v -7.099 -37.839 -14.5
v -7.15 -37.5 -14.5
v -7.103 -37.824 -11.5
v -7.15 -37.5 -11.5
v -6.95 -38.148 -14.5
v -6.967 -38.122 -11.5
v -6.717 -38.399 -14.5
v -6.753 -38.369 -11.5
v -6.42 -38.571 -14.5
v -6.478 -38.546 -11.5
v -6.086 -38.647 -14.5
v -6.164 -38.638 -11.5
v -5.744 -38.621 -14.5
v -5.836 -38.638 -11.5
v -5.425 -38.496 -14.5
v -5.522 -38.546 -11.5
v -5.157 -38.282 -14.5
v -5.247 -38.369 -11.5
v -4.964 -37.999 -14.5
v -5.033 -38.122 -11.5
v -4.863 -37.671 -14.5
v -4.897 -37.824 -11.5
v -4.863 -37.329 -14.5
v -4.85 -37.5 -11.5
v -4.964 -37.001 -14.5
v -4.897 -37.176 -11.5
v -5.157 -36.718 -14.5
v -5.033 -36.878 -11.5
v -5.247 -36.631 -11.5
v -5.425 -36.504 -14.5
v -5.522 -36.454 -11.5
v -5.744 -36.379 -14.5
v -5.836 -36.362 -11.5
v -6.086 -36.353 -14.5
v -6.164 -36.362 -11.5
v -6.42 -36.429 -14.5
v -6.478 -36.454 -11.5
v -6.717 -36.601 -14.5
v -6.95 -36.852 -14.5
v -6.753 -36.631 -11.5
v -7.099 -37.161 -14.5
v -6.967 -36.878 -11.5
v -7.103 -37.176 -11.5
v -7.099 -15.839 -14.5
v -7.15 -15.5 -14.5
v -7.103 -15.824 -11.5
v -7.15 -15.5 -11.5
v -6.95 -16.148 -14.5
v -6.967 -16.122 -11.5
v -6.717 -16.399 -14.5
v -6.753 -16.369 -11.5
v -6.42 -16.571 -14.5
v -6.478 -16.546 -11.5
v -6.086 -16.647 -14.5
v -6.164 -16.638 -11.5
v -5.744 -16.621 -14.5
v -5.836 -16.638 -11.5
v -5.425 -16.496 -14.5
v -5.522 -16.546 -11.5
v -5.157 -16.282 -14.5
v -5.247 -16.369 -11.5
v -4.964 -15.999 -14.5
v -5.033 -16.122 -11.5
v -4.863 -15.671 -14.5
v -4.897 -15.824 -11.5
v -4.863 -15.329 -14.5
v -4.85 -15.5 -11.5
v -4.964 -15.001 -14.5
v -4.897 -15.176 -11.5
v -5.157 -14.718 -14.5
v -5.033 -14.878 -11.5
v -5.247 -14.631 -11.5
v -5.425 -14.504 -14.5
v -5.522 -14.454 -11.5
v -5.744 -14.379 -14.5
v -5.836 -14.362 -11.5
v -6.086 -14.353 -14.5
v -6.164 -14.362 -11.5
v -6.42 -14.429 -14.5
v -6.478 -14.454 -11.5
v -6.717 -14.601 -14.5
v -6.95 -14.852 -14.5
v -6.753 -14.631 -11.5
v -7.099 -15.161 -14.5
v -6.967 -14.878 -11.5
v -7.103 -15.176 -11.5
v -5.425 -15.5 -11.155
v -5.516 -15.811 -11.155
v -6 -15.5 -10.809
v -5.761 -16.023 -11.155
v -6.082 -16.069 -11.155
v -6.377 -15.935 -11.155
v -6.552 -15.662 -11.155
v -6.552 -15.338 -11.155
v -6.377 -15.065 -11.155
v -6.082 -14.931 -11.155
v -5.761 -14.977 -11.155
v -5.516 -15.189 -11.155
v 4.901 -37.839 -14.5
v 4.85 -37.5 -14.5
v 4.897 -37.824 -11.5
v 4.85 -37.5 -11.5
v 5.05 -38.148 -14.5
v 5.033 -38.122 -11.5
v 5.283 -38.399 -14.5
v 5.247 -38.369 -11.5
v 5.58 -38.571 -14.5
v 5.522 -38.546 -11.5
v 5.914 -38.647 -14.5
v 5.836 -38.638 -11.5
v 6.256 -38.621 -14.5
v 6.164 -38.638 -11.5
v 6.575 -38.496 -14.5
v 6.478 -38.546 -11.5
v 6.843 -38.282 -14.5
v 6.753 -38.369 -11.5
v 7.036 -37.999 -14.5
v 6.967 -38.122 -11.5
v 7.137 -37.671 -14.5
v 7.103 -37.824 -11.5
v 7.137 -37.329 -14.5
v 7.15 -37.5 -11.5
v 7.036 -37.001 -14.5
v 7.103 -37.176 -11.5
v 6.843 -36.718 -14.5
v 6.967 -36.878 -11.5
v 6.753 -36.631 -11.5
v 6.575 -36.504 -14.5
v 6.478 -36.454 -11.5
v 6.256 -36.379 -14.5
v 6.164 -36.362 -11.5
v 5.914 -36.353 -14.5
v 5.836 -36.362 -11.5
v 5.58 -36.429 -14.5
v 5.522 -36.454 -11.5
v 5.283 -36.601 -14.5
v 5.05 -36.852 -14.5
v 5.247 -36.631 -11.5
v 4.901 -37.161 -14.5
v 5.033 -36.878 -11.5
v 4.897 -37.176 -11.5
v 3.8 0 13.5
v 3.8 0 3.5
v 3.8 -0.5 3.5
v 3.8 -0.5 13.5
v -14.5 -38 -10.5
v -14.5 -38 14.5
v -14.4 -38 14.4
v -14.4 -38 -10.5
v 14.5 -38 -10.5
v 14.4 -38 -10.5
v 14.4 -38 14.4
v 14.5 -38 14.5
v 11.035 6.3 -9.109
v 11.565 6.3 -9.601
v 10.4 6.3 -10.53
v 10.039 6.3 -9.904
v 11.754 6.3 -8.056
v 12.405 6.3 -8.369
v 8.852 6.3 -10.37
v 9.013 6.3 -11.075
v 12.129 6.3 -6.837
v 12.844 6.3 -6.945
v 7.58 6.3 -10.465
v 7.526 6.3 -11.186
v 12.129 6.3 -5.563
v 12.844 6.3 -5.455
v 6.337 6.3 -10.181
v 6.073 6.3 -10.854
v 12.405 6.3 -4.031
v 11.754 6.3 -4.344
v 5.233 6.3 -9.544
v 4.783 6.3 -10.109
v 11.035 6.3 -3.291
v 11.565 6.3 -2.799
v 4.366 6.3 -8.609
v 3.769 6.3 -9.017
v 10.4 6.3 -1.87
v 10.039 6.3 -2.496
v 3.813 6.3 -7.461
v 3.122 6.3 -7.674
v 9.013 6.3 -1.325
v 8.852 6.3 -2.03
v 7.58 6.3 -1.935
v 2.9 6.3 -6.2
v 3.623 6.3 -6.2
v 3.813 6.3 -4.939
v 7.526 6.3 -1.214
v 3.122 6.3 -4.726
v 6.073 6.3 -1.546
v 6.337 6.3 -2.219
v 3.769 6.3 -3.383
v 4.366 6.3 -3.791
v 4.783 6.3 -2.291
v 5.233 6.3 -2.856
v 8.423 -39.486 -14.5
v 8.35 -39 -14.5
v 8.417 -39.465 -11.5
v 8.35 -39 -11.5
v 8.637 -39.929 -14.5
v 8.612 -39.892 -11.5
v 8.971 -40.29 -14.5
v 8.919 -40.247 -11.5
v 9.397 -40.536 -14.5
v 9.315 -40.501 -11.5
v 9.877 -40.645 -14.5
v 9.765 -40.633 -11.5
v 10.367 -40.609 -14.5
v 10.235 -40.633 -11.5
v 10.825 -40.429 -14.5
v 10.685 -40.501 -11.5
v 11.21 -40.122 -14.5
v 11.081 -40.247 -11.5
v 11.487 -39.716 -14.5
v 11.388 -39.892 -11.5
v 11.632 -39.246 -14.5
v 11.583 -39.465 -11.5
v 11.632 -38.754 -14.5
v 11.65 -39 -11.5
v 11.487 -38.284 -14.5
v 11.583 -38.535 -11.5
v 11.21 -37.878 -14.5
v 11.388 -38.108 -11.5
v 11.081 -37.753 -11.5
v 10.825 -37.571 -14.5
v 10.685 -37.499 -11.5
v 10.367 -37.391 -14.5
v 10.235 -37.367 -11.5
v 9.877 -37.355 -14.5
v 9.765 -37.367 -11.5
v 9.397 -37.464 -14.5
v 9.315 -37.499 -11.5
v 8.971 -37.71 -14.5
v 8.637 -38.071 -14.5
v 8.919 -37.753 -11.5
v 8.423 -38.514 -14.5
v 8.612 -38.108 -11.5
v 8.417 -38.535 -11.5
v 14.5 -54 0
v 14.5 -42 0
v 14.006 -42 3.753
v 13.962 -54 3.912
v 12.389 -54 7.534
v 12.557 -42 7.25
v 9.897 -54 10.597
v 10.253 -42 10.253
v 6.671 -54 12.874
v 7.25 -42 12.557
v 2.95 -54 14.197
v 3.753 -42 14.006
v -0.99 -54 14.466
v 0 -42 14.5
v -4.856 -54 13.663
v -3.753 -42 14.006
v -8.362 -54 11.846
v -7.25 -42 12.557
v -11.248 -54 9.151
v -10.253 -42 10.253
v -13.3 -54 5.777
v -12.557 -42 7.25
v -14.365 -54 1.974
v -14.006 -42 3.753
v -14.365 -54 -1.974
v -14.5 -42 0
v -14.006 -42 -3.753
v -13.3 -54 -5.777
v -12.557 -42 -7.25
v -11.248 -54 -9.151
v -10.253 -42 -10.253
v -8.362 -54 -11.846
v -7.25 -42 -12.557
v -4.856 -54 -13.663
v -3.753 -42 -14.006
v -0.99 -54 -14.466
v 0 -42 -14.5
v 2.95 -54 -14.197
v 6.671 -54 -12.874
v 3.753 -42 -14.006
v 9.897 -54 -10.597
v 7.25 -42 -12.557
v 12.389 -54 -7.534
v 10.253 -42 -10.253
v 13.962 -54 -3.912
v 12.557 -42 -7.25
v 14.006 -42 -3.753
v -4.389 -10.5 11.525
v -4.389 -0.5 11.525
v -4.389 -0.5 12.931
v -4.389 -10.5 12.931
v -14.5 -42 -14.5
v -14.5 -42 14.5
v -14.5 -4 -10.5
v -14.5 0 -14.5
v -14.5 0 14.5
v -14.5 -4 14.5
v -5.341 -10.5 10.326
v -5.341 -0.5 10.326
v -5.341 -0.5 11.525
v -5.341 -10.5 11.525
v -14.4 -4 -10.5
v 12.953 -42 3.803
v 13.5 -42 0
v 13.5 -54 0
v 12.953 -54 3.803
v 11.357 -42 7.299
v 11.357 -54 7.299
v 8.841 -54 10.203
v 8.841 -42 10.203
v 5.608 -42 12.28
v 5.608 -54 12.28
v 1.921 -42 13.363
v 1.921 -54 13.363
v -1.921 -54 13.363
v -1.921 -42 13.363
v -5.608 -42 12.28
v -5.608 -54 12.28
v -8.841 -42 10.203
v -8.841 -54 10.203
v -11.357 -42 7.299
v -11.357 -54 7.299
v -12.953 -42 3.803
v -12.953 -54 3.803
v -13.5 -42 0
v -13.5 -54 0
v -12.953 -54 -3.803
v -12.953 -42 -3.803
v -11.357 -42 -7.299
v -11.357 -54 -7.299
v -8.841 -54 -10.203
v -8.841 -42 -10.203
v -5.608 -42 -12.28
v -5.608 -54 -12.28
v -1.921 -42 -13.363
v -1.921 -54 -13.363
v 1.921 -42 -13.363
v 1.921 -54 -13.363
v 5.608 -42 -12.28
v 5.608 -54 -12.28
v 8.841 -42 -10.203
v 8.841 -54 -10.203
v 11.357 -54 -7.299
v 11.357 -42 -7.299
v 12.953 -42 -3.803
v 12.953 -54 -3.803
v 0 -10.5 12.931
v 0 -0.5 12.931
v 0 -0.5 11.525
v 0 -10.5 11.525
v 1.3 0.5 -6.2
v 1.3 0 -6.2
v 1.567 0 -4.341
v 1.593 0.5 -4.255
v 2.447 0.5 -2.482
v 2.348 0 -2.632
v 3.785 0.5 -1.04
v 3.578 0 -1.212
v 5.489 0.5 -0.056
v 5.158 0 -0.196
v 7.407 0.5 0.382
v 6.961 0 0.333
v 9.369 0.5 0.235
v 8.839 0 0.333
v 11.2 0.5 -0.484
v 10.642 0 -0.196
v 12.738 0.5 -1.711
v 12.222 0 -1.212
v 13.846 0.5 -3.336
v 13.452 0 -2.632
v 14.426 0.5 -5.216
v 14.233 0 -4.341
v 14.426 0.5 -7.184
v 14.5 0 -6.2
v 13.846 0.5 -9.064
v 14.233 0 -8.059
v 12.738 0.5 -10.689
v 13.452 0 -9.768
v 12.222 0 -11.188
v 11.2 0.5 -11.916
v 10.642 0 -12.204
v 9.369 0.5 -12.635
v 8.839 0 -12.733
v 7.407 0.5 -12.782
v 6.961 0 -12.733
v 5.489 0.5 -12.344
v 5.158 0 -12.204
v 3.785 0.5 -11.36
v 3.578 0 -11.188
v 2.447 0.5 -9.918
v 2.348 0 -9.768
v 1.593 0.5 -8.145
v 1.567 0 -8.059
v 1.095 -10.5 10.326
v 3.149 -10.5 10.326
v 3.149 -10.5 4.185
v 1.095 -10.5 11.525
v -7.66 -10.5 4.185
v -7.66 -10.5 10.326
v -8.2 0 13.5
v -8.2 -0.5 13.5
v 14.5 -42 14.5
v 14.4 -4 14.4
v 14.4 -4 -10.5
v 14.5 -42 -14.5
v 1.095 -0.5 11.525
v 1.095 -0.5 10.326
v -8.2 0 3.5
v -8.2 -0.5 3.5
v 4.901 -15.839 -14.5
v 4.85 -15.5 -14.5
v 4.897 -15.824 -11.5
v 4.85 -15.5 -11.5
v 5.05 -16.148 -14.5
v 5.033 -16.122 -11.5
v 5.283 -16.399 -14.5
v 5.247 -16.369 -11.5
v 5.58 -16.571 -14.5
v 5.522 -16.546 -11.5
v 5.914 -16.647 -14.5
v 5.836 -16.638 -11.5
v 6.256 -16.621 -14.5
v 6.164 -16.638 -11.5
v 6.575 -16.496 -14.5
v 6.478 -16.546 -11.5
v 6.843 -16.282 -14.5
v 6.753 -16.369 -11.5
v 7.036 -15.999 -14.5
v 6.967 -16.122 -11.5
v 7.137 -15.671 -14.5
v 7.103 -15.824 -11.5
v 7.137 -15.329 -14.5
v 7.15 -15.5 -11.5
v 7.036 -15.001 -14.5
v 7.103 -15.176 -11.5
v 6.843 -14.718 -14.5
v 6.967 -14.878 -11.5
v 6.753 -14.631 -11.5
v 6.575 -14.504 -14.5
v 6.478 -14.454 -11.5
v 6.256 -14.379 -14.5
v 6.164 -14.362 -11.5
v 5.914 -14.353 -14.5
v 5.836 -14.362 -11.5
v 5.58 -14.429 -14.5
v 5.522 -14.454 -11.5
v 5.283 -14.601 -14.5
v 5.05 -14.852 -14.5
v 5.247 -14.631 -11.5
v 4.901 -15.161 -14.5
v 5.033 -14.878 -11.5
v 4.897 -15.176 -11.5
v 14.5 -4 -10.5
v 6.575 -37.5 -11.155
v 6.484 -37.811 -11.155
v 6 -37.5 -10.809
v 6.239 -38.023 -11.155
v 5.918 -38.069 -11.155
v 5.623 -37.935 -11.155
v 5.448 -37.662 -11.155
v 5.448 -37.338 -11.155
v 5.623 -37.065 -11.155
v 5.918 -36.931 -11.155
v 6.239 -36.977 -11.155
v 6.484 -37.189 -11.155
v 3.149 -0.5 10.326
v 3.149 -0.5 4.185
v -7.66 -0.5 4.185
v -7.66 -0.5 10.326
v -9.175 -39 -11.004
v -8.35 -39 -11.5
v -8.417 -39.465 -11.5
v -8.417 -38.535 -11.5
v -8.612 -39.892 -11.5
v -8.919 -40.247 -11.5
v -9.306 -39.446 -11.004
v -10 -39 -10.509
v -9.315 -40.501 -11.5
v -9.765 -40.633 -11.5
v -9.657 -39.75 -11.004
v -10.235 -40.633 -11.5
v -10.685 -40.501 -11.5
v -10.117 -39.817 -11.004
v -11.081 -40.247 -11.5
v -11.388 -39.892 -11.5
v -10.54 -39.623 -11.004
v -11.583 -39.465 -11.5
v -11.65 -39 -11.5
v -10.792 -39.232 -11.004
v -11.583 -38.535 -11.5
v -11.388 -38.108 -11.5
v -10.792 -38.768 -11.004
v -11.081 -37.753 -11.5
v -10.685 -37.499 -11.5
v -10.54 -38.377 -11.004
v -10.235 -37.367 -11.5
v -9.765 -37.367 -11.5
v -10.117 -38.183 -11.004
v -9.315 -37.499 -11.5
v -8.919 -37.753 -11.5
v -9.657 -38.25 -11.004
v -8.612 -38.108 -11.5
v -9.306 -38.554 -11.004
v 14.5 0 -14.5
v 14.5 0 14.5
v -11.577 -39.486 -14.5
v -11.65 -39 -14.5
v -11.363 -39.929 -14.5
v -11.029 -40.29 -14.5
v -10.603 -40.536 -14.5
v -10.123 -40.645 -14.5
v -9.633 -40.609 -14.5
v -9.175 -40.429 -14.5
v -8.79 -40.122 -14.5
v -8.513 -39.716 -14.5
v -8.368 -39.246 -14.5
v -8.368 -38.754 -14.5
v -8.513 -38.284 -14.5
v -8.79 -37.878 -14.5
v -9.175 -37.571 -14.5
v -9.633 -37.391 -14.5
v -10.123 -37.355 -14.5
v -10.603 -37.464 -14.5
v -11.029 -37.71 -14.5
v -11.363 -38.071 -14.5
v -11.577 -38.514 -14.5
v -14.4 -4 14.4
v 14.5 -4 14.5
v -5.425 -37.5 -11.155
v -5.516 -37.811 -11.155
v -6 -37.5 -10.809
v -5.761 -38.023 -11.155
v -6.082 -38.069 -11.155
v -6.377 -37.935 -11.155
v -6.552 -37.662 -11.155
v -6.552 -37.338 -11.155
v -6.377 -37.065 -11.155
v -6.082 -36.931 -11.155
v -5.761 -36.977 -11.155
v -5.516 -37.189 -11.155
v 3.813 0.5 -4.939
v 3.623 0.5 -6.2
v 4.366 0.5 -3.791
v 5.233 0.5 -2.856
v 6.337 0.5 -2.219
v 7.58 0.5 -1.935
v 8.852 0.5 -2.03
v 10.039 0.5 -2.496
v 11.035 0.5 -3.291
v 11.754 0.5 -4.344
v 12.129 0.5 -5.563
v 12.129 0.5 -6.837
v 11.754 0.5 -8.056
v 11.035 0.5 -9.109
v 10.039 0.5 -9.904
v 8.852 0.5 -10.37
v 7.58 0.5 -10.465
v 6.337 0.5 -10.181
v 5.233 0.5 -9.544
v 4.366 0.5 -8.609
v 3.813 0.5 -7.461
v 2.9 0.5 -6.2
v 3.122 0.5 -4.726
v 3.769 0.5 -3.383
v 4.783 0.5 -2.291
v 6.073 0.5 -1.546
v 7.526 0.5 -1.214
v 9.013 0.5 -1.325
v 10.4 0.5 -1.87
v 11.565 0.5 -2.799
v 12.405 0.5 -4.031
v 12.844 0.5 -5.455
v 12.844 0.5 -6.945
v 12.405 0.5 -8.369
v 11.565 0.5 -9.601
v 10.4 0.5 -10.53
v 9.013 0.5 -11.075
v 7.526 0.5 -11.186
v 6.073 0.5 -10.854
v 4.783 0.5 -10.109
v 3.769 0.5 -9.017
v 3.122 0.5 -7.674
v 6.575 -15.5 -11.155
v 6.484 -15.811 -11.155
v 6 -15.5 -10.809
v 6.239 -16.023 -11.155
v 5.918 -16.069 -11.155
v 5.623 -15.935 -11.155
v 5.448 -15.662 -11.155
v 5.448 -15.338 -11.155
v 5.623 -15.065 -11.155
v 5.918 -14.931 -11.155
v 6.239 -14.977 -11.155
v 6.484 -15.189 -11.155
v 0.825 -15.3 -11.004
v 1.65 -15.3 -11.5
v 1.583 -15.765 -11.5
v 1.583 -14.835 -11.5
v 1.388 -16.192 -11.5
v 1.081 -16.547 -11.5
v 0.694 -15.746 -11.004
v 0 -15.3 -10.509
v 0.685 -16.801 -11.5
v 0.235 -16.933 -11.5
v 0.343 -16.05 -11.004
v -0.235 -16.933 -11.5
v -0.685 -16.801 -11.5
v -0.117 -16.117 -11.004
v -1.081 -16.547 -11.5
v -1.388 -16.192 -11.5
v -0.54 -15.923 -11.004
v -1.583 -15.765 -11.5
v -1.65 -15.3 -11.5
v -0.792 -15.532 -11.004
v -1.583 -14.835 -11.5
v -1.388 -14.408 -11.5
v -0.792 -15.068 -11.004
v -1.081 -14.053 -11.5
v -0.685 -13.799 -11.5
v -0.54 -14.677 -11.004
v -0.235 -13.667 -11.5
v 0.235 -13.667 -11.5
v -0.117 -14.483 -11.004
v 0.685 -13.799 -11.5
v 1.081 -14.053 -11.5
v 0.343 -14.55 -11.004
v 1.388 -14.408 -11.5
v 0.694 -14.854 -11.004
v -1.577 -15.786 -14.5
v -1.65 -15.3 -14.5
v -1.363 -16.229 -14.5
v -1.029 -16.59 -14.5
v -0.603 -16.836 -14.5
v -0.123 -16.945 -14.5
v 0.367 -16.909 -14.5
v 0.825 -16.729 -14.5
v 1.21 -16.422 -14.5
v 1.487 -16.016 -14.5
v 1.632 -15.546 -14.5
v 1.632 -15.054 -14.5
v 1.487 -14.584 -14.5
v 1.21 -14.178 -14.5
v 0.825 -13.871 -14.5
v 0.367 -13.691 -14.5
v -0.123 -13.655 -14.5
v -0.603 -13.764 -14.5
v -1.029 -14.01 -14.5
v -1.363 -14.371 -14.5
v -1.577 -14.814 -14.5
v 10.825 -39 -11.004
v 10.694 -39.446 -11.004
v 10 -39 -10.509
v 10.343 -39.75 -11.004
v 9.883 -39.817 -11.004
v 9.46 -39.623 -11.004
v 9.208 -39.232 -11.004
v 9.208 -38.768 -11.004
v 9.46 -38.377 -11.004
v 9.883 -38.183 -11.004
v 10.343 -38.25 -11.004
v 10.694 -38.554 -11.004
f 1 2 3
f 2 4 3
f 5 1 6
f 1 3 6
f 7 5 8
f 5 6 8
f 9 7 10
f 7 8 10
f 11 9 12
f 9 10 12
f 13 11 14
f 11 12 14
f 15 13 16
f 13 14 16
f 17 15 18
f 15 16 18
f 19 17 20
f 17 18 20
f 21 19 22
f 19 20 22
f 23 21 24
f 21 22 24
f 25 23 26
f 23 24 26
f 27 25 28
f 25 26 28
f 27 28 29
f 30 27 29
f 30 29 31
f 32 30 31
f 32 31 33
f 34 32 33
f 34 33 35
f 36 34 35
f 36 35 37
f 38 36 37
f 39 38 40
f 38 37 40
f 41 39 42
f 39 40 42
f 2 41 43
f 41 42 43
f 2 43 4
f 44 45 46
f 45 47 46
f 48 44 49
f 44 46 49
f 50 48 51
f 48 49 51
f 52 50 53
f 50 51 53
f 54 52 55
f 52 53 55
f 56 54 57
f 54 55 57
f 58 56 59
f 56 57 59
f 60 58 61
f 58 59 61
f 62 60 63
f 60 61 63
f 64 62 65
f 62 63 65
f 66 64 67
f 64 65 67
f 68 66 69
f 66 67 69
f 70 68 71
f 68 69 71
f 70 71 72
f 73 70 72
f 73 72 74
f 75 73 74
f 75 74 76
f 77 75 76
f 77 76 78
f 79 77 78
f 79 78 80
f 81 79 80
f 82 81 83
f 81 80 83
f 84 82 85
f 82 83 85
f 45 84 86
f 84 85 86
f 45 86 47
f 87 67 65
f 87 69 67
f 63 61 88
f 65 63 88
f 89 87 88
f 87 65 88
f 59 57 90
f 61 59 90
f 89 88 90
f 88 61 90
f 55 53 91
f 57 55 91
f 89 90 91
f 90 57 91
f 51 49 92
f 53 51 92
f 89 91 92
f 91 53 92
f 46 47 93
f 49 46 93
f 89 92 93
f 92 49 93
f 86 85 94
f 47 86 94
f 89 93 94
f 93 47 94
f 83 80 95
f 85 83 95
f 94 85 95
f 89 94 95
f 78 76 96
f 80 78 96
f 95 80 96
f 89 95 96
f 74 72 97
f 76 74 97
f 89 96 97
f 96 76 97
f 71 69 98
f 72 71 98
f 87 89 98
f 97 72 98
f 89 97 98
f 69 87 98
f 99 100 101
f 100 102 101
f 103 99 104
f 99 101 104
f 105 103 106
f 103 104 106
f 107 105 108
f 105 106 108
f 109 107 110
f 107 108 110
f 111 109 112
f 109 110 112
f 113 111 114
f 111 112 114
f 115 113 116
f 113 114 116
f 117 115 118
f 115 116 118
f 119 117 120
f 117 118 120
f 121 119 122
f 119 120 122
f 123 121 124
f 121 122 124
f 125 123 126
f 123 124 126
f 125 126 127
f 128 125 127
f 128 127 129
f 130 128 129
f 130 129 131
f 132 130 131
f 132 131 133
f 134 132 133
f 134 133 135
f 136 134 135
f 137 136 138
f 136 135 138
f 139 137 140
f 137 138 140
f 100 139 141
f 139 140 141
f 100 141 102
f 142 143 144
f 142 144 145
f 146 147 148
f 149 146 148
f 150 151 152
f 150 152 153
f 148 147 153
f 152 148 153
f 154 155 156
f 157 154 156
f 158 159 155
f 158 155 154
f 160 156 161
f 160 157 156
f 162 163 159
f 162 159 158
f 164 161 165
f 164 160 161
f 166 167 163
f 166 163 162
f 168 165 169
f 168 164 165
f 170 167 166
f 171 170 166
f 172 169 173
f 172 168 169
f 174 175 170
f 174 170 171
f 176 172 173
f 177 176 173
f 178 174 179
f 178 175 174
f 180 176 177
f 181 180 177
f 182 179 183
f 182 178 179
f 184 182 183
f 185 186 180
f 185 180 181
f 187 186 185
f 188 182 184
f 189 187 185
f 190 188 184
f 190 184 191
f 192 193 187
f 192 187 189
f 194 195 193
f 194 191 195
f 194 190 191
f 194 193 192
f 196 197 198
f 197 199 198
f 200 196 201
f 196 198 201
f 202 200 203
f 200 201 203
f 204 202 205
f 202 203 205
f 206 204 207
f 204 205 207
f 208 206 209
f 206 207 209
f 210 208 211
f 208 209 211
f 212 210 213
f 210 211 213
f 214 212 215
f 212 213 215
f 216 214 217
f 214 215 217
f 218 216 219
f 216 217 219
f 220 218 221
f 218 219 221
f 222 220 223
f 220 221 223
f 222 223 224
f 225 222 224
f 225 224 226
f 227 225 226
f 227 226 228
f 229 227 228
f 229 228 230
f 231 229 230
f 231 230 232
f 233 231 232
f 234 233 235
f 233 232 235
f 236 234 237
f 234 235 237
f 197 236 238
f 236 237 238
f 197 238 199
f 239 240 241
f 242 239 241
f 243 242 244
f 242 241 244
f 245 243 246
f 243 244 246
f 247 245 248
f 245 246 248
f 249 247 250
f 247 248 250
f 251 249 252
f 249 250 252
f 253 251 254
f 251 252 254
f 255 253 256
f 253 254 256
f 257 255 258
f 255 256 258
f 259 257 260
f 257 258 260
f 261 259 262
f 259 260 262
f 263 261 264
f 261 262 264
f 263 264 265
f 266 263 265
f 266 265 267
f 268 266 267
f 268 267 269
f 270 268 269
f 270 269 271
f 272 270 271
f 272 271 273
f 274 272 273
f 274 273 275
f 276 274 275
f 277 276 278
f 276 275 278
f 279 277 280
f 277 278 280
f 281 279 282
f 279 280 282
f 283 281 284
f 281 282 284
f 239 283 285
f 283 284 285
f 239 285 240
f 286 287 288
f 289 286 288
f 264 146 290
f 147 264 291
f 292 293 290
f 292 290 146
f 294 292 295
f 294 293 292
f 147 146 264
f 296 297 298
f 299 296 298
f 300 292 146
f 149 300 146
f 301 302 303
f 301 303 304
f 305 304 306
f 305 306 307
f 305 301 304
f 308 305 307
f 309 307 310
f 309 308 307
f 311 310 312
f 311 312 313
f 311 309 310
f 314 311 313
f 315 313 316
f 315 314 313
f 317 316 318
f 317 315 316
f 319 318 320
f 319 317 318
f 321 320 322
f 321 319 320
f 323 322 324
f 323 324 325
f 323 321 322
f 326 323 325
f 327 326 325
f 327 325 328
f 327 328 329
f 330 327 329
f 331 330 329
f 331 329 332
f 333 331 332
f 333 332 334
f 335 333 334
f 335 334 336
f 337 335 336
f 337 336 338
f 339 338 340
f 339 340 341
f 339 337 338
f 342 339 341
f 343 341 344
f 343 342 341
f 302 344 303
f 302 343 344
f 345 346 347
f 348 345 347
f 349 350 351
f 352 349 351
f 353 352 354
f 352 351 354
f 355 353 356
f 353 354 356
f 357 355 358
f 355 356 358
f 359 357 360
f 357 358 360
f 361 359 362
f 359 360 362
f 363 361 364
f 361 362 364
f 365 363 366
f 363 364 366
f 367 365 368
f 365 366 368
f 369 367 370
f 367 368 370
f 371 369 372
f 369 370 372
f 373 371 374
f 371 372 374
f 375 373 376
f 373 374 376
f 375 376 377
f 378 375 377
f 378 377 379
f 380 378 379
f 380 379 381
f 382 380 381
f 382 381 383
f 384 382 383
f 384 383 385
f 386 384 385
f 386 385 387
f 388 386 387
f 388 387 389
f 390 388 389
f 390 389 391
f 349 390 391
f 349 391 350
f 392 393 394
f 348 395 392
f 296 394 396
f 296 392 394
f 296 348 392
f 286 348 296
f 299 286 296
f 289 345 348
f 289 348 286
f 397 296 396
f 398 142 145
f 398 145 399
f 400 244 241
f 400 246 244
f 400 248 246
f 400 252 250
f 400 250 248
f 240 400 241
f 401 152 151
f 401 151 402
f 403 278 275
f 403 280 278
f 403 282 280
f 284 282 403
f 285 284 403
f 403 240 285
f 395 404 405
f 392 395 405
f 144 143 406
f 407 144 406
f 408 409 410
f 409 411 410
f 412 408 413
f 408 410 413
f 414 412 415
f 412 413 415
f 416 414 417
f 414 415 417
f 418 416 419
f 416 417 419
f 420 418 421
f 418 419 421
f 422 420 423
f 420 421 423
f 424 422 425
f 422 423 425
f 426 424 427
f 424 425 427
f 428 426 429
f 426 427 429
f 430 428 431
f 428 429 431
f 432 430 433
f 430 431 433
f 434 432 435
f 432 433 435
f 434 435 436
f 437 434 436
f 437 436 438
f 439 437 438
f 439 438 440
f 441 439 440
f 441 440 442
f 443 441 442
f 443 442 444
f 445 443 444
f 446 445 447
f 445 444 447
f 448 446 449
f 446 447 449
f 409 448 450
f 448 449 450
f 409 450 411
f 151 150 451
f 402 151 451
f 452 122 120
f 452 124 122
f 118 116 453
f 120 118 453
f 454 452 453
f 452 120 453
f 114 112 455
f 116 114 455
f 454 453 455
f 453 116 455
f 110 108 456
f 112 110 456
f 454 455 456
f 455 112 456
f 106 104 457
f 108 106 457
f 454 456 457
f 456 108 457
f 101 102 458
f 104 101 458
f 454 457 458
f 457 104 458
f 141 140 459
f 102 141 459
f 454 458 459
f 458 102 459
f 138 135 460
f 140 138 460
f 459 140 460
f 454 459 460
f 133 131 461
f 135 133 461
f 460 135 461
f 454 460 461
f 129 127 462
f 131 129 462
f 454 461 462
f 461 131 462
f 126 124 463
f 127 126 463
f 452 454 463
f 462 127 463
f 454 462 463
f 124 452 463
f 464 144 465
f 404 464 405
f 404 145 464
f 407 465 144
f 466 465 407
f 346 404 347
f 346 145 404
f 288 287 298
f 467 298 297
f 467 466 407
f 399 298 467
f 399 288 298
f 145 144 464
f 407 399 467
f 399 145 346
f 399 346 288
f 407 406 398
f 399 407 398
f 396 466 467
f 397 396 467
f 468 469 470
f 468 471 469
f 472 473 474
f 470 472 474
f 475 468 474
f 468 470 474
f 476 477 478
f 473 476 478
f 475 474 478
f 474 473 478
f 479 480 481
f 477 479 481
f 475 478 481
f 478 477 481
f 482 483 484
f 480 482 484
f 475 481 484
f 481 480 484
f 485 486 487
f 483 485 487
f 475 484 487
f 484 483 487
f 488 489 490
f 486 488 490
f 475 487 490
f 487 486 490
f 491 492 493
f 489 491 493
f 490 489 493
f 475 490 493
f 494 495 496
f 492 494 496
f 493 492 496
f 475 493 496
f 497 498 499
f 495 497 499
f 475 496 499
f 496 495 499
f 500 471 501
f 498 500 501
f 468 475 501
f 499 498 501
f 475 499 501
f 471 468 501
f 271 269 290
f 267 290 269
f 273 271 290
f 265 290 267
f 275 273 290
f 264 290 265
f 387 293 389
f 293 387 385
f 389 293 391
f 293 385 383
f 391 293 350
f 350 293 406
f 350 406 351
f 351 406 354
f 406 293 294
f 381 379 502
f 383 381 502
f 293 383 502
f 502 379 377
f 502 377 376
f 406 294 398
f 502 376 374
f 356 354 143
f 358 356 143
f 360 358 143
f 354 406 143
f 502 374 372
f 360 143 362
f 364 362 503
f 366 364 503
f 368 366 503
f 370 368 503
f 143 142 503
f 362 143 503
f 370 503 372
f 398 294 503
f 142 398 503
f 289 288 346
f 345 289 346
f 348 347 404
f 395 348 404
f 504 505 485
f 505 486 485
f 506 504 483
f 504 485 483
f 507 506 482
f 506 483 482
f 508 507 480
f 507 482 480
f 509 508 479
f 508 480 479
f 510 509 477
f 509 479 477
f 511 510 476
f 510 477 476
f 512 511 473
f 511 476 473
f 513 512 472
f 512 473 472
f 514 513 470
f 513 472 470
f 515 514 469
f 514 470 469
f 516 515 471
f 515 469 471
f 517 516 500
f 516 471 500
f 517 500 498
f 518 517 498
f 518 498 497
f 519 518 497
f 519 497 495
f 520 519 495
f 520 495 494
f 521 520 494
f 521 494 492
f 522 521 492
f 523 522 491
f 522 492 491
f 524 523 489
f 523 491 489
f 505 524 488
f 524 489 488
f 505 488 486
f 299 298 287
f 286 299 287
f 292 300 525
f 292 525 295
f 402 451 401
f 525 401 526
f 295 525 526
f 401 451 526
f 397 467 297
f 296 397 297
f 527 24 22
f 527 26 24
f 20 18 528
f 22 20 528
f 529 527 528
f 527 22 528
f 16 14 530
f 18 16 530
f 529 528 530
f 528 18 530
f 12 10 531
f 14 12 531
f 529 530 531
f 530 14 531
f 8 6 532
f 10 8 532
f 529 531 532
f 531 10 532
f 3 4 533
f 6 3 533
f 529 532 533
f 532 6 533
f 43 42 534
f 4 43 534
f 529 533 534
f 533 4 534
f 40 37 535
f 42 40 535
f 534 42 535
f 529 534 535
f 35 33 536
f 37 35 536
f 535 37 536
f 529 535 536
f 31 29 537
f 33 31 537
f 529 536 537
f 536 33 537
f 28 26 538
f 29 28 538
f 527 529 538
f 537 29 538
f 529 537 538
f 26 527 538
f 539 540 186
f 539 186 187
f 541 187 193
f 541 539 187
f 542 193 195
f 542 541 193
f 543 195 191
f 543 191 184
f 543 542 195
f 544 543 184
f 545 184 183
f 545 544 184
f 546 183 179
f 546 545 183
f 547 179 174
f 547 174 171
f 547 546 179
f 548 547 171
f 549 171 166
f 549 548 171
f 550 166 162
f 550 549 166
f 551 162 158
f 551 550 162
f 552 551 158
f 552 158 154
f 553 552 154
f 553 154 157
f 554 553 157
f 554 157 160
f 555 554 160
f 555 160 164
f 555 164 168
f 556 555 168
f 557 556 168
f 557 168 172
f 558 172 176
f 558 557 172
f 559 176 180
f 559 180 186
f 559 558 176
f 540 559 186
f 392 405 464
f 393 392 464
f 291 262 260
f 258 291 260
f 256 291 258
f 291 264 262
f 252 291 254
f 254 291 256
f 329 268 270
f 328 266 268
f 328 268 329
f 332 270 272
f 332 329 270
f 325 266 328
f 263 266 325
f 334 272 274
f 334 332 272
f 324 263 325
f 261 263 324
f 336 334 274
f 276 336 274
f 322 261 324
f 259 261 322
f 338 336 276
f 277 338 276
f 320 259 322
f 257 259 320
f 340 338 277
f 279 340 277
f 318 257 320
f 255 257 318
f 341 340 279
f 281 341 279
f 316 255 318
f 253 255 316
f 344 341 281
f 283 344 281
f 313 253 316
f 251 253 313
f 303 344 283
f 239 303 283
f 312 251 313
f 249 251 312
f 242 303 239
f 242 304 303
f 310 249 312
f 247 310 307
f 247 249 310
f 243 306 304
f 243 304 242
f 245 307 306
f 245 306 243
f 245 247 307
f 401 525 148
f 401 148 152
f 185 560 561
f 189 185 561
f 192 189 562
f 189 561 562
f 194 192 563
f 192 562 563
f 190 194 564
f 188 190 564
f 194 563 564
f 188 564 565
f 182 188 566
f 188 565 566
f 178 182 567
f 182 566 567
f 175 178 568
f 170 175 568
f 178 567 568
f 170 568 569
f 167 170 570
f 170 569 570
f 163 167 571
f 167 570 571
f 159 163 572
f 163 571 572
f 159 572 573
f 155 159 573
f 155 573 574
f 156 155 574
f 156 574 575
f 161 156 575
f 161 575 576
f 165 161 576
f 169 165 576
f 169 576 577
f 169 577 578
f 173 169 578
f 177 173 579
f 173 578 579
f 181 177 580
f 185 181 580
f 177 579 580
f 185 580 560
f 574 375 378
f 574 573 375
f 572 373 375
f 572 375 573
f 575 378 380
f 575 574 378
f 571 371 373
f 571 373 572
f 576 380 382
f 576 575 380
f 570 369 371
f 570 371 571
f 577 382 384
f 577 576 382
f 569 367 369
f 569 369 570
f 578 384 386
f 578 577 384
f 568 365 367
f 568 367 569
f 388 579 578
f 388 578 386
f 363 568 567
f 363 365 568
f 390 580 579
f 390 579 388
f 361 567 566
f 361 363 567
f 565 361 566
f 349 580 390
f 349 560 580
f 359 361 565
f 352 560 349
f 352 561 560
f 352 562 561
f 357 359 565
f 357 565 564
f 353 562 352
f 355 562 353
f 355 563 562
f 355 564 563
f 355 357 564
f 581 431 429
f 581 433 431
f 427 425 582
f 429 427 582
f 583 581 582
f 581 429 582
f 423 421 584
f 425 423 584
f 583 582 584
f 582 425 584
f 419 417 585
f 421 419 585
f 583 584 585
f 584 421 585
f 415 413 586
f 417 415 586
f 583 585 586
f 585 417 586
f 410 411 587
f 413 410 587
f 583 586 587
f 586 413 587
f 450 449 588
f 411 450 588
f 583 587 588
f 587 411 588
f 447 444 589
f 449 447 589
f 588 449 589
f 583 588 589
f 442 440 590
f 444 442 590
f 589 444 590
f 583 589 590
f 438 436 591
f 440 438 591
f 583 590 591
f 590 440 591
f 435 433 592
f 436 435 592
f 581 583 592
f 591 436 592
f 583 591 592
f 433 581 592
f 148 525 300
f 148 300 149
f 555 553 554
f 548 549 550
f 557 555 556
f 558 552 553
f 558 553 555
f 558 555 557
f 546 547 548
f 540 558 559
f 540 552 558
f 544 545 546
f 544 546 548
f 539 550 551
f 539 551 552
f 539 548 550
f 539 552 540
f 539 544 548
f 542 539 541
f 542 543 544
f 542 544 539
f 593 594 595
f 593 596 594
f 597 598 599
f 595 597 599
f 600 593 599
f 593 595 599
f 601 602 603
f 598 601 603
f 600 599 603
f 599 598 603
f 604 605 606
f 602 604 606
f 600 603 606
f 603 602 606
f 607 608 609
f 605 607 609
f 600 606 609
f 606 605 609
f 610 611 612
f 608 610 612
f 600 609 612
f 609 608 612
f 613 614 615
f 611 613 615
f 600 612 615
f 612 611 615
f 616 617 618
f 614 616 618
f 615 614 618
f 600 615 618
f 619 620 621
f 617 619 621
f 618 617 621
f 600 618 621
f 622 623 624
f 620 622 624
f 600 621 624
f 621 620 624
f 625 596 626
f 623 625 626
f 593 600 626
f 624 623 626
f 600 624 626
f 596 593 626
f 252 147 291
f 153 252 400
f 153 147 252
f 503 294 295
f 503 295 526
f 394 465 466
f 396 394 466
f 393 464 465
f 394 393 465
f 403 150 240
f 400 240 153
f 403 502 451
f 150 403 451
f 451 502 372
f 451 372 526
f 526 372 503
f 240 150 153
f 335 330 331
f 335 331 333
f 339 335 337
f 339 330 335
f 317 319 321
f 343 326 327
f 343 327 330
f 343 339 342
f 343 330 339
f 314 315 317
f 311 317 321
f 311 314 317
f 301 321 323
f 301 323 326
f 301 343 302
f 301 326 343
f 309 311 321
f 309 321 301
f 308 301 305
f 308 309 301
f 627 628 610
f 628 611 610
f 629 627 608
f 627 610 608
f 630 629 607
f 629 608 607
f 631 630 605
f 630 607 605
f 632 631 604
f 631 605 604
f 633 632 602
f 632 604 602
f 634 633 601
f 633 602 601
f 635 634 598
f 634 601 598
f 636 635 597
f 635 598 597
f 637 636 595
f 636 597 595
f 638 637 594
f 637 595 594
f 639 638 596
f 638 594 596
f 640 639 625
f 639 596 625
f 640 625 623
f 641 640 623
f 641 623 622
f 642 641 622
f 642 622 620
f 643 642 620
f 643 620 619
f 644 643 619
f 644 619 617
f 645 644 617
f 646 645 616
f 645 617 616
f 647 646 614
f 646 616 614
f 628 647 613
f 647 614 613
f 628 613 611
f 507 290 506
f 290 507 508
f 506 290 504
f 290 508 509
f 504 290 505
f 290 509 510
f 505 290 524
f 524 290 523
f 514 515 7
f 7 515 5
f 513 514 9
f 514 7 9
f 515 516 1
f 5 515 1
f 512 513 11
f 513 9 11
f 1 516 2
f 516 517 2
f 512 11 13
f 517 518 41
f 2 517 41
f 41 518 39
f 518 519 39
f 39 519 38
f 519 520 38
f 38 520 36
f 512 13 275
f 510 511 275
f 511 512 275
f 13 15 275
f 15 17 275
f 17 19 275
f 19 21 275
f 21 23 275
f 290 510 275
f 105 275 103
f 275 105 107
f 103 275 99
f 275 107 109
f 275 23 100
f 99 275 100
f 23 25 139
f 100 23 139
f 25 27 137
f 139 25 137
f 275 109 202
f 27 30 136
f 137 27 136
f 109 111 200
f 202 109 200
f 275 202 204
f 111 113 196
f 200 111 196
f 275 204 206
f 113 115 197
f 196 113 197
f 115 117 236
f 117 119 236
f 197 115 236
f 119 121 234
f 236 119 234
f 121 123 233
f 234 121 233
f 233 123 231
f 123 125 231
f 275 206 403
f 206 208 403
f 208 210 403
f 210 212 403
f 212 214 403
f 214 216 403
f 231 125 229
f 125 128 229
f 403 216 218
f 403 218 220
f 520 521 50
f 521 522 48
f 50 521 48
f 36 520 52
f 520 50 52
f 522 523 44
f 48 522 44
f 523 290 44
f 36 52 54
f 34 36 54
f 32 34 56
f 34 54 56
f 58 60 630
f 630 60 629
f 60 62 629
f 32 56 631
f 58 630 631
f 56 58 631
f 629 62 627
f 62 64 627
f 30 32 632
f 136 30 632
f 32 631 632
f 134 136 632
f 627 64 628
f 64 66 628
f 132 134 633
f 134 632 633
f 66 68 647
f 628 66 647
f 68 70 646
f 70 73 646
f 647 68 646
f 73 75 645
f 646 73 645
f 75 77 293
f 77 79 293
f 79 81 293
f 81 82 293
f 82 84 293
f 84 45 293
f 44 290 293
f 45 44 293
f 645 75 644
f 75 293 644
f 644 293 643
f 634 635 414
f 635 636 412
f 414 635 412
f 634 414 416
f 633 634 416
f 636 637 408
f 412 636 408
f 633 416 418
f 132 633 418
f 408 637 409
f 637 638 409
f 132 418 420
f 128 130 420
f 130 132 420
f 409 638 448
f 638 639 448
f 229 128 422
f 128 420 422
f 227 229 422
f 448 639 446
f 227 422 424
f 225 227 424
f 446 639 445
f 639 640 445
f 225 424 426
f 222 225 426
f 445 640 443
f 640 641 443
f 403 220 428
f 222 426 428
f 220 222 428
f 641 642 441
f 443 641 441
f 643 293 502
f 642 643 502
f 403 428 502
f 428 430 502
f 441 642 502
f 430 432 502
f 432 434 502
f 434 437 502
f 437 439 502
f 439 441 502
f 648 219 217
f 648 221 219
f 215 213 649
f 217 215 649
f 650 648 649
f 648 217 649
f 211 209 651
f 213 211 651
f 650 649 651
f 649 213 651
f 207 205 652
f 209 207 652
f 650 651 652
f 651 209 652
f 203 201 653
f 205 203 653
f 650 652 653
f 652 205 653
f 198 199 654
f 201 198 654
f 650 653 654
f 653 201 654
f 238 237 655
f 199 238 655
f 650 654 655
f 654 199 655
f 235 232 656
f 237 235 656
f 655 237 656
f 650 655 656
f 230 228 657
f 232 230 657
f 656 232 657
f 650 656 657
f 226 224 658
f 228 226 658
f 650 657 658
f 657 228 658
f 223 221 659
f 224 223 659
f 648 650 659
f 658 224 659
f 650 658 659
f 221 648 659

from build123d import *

# Parameters (mm, degrees)
F0_W      = 29
F0_H      = 29
F1_DEPTH  = 42
F2_R      = 14.5
F2_R_2    = 13.5
F3_DEPTH  = 12
F4_W      = 34
F4_H      = 25
F5_DEPTH  = 0.1
F6_W      = 34
F6_H      = 25
F7_DEPTH  = 0.1
F8_W      = 28.9
F8_H      = 34
F9_DEPTH  = 0.1
F11_D     = 3.3
F11_DEPTH = 3
F11_TIP   = 0.9914200214
F13_D     = 2.3
F13_DEPTH = 3
F13_TIP   = 0.6909897119
F14_R     = 6.6
F15_DEPTH = 0.5
F16_W     = 12
F16_H     = 10
F17_DEPTH = 0.5
F19_DEPTH = 10
F20_R     = 5
F20_R_2   = 4.2771578829
F21_DEPTH = 5.8


with BuildPart() as f1:
    # F0 (on Front) → F1 (new body)
    with BuildSketch(Plane.XZ):
        Rectangle(F0_W, F0_H)
    extrude(amount=F1_DEPTH)

    # F2 (on face) → F3 (join)
    with BuildSketch(Plane.XZ.offset(42)):
        Circle(F2_R)
        Circle(F2_R_2, mode=Mode.SUBTRACT)
    extrude(amount=F3_DEPTH)

    # F4 (on face) → F5 (cut)
    with BuildSketch(Plane.YZ.offset(14.5)):
        with Locations((-21, 2)):
            Rectangle(F4_W, F4_H)
    extrude(amount=-F5_DEPTH, mode=Mode.SUBTRACT)

    # F6 (on face) → F7 (cut)
    with BuildSketch(Plane(origin=(-14.5, 0, 0), x_dir=(0, -1, 0), z_dir=(-1, 0, 0))):
        with Locations((21, 2)):
            Rectangle(F6_W, F6_H)
    extrude(amount=-F7_DEPTH, mode=Mode.SUBTRACT)

    # F8 (on face) → F9 (cut)
    with BuildSketch(Plane.XY.offset(14.5)):
        with Locations((0.05, -21)):
            Rectangle(F8_W, F8_H)
    extrude(amount=-F9_DEPTH, mode=Mode.SUBTRACT)

    # F11
    with Locations(Plane(origin=(0, 0, -14.5), x_dir=(1, 0, 0), z_dir=(0, 0, -1))):
        with Locations((0, 15.3), (10, 39), (-10, 39)):
            Hole(F11_D / 2, depth=F11_DEPTH)
            with Locations((0, 0, -(F11_DEPTH + F11_TIP / 2))):  # 118° drill point
                Cone(0, F11_D / 2, F11_TIP, mode=Mode.SUBTRACT)

    # F13
    with Locations(Plane(origin=(0, 0, -14.5), x_dir=(1, 0, 0), z_dir=(0, 0, -1))):
        with Locations((6, 15.5), (-6, 15.5), (6, 37.5), (-6, 37.5)):
            Hole(F13_D / 2, depth=F13_DEPTH)
            with Locations((0, 0, -(F13_DEPTH + F13_TIP / 2))):  # 118° drill point
                Cone(0, F13_D / 2, F13_TIP, mode=Mode.SUBTRACT)

    # F14 (on face) → F15 (join)
    with BuildSketch(Plane(origin=(0, 0, 0), x_dir=(-1, 0, 0), z_dir=(0, 1, 0))):
        with Locations((-7.9, -6.2)):
            Circle(F14_R)
    extrude(amount=F15_DEPTH)

    # F16 (on face) → F17 (cut)
    with BuildSketch(Plane(origin=(0, 0, 0), x_dir=(-1, 0, 0), z_dir=(0, 1, 0))):
        with Locations((2.2, 8.5)):
            Rectangle(F16_W, F16_H)
    extrude(amount=-F17_DEPTH, mode=Mode.SUBTRACT)

    # F18 (on face) → F19 (cut)
    with BuildSketch(Plane(origin=(0, -0.5, 0), x_dir=(-1, 0, 0), z_dir=(0, 1, 0))):
        Polygon((-3.1485289801, 10.3262867779), (-3.1485289801, 4.1849459521), (7.6598110609, 4.1849459521), (7.6598110609, 10.3262867779), (5.341138225, 10.3262867779), (5.341138225, 11.5245990455), (4.3890266679, 11.5245990455), (4.3890266679, 12.9305869341), (0, 12.9305869341), (0, 11.5245990455), (-1.0954904137, 11.5245990455), (-1.0954904137, 10.3262867779), align=None)
    extrude(amount=-F19_DEPTH, mode=Mode.SUBTRACT)

    # F20 (on face) → F21 (join)
    with BuildSketch(Plane(origin=(0, 0.5, 0), x_dir=(-1, 0, 0), z_dir=(0, 1, 0))):
        with Locations((-7.9, -6.2)):
            Circle(F20_R)
        with Locations((-7.9, -6.2)):
            Circle(F20_R_2, mode=Mode.SUBTRACT)
    extrude(amount=F21_DEPTH)


solid = f1.part
